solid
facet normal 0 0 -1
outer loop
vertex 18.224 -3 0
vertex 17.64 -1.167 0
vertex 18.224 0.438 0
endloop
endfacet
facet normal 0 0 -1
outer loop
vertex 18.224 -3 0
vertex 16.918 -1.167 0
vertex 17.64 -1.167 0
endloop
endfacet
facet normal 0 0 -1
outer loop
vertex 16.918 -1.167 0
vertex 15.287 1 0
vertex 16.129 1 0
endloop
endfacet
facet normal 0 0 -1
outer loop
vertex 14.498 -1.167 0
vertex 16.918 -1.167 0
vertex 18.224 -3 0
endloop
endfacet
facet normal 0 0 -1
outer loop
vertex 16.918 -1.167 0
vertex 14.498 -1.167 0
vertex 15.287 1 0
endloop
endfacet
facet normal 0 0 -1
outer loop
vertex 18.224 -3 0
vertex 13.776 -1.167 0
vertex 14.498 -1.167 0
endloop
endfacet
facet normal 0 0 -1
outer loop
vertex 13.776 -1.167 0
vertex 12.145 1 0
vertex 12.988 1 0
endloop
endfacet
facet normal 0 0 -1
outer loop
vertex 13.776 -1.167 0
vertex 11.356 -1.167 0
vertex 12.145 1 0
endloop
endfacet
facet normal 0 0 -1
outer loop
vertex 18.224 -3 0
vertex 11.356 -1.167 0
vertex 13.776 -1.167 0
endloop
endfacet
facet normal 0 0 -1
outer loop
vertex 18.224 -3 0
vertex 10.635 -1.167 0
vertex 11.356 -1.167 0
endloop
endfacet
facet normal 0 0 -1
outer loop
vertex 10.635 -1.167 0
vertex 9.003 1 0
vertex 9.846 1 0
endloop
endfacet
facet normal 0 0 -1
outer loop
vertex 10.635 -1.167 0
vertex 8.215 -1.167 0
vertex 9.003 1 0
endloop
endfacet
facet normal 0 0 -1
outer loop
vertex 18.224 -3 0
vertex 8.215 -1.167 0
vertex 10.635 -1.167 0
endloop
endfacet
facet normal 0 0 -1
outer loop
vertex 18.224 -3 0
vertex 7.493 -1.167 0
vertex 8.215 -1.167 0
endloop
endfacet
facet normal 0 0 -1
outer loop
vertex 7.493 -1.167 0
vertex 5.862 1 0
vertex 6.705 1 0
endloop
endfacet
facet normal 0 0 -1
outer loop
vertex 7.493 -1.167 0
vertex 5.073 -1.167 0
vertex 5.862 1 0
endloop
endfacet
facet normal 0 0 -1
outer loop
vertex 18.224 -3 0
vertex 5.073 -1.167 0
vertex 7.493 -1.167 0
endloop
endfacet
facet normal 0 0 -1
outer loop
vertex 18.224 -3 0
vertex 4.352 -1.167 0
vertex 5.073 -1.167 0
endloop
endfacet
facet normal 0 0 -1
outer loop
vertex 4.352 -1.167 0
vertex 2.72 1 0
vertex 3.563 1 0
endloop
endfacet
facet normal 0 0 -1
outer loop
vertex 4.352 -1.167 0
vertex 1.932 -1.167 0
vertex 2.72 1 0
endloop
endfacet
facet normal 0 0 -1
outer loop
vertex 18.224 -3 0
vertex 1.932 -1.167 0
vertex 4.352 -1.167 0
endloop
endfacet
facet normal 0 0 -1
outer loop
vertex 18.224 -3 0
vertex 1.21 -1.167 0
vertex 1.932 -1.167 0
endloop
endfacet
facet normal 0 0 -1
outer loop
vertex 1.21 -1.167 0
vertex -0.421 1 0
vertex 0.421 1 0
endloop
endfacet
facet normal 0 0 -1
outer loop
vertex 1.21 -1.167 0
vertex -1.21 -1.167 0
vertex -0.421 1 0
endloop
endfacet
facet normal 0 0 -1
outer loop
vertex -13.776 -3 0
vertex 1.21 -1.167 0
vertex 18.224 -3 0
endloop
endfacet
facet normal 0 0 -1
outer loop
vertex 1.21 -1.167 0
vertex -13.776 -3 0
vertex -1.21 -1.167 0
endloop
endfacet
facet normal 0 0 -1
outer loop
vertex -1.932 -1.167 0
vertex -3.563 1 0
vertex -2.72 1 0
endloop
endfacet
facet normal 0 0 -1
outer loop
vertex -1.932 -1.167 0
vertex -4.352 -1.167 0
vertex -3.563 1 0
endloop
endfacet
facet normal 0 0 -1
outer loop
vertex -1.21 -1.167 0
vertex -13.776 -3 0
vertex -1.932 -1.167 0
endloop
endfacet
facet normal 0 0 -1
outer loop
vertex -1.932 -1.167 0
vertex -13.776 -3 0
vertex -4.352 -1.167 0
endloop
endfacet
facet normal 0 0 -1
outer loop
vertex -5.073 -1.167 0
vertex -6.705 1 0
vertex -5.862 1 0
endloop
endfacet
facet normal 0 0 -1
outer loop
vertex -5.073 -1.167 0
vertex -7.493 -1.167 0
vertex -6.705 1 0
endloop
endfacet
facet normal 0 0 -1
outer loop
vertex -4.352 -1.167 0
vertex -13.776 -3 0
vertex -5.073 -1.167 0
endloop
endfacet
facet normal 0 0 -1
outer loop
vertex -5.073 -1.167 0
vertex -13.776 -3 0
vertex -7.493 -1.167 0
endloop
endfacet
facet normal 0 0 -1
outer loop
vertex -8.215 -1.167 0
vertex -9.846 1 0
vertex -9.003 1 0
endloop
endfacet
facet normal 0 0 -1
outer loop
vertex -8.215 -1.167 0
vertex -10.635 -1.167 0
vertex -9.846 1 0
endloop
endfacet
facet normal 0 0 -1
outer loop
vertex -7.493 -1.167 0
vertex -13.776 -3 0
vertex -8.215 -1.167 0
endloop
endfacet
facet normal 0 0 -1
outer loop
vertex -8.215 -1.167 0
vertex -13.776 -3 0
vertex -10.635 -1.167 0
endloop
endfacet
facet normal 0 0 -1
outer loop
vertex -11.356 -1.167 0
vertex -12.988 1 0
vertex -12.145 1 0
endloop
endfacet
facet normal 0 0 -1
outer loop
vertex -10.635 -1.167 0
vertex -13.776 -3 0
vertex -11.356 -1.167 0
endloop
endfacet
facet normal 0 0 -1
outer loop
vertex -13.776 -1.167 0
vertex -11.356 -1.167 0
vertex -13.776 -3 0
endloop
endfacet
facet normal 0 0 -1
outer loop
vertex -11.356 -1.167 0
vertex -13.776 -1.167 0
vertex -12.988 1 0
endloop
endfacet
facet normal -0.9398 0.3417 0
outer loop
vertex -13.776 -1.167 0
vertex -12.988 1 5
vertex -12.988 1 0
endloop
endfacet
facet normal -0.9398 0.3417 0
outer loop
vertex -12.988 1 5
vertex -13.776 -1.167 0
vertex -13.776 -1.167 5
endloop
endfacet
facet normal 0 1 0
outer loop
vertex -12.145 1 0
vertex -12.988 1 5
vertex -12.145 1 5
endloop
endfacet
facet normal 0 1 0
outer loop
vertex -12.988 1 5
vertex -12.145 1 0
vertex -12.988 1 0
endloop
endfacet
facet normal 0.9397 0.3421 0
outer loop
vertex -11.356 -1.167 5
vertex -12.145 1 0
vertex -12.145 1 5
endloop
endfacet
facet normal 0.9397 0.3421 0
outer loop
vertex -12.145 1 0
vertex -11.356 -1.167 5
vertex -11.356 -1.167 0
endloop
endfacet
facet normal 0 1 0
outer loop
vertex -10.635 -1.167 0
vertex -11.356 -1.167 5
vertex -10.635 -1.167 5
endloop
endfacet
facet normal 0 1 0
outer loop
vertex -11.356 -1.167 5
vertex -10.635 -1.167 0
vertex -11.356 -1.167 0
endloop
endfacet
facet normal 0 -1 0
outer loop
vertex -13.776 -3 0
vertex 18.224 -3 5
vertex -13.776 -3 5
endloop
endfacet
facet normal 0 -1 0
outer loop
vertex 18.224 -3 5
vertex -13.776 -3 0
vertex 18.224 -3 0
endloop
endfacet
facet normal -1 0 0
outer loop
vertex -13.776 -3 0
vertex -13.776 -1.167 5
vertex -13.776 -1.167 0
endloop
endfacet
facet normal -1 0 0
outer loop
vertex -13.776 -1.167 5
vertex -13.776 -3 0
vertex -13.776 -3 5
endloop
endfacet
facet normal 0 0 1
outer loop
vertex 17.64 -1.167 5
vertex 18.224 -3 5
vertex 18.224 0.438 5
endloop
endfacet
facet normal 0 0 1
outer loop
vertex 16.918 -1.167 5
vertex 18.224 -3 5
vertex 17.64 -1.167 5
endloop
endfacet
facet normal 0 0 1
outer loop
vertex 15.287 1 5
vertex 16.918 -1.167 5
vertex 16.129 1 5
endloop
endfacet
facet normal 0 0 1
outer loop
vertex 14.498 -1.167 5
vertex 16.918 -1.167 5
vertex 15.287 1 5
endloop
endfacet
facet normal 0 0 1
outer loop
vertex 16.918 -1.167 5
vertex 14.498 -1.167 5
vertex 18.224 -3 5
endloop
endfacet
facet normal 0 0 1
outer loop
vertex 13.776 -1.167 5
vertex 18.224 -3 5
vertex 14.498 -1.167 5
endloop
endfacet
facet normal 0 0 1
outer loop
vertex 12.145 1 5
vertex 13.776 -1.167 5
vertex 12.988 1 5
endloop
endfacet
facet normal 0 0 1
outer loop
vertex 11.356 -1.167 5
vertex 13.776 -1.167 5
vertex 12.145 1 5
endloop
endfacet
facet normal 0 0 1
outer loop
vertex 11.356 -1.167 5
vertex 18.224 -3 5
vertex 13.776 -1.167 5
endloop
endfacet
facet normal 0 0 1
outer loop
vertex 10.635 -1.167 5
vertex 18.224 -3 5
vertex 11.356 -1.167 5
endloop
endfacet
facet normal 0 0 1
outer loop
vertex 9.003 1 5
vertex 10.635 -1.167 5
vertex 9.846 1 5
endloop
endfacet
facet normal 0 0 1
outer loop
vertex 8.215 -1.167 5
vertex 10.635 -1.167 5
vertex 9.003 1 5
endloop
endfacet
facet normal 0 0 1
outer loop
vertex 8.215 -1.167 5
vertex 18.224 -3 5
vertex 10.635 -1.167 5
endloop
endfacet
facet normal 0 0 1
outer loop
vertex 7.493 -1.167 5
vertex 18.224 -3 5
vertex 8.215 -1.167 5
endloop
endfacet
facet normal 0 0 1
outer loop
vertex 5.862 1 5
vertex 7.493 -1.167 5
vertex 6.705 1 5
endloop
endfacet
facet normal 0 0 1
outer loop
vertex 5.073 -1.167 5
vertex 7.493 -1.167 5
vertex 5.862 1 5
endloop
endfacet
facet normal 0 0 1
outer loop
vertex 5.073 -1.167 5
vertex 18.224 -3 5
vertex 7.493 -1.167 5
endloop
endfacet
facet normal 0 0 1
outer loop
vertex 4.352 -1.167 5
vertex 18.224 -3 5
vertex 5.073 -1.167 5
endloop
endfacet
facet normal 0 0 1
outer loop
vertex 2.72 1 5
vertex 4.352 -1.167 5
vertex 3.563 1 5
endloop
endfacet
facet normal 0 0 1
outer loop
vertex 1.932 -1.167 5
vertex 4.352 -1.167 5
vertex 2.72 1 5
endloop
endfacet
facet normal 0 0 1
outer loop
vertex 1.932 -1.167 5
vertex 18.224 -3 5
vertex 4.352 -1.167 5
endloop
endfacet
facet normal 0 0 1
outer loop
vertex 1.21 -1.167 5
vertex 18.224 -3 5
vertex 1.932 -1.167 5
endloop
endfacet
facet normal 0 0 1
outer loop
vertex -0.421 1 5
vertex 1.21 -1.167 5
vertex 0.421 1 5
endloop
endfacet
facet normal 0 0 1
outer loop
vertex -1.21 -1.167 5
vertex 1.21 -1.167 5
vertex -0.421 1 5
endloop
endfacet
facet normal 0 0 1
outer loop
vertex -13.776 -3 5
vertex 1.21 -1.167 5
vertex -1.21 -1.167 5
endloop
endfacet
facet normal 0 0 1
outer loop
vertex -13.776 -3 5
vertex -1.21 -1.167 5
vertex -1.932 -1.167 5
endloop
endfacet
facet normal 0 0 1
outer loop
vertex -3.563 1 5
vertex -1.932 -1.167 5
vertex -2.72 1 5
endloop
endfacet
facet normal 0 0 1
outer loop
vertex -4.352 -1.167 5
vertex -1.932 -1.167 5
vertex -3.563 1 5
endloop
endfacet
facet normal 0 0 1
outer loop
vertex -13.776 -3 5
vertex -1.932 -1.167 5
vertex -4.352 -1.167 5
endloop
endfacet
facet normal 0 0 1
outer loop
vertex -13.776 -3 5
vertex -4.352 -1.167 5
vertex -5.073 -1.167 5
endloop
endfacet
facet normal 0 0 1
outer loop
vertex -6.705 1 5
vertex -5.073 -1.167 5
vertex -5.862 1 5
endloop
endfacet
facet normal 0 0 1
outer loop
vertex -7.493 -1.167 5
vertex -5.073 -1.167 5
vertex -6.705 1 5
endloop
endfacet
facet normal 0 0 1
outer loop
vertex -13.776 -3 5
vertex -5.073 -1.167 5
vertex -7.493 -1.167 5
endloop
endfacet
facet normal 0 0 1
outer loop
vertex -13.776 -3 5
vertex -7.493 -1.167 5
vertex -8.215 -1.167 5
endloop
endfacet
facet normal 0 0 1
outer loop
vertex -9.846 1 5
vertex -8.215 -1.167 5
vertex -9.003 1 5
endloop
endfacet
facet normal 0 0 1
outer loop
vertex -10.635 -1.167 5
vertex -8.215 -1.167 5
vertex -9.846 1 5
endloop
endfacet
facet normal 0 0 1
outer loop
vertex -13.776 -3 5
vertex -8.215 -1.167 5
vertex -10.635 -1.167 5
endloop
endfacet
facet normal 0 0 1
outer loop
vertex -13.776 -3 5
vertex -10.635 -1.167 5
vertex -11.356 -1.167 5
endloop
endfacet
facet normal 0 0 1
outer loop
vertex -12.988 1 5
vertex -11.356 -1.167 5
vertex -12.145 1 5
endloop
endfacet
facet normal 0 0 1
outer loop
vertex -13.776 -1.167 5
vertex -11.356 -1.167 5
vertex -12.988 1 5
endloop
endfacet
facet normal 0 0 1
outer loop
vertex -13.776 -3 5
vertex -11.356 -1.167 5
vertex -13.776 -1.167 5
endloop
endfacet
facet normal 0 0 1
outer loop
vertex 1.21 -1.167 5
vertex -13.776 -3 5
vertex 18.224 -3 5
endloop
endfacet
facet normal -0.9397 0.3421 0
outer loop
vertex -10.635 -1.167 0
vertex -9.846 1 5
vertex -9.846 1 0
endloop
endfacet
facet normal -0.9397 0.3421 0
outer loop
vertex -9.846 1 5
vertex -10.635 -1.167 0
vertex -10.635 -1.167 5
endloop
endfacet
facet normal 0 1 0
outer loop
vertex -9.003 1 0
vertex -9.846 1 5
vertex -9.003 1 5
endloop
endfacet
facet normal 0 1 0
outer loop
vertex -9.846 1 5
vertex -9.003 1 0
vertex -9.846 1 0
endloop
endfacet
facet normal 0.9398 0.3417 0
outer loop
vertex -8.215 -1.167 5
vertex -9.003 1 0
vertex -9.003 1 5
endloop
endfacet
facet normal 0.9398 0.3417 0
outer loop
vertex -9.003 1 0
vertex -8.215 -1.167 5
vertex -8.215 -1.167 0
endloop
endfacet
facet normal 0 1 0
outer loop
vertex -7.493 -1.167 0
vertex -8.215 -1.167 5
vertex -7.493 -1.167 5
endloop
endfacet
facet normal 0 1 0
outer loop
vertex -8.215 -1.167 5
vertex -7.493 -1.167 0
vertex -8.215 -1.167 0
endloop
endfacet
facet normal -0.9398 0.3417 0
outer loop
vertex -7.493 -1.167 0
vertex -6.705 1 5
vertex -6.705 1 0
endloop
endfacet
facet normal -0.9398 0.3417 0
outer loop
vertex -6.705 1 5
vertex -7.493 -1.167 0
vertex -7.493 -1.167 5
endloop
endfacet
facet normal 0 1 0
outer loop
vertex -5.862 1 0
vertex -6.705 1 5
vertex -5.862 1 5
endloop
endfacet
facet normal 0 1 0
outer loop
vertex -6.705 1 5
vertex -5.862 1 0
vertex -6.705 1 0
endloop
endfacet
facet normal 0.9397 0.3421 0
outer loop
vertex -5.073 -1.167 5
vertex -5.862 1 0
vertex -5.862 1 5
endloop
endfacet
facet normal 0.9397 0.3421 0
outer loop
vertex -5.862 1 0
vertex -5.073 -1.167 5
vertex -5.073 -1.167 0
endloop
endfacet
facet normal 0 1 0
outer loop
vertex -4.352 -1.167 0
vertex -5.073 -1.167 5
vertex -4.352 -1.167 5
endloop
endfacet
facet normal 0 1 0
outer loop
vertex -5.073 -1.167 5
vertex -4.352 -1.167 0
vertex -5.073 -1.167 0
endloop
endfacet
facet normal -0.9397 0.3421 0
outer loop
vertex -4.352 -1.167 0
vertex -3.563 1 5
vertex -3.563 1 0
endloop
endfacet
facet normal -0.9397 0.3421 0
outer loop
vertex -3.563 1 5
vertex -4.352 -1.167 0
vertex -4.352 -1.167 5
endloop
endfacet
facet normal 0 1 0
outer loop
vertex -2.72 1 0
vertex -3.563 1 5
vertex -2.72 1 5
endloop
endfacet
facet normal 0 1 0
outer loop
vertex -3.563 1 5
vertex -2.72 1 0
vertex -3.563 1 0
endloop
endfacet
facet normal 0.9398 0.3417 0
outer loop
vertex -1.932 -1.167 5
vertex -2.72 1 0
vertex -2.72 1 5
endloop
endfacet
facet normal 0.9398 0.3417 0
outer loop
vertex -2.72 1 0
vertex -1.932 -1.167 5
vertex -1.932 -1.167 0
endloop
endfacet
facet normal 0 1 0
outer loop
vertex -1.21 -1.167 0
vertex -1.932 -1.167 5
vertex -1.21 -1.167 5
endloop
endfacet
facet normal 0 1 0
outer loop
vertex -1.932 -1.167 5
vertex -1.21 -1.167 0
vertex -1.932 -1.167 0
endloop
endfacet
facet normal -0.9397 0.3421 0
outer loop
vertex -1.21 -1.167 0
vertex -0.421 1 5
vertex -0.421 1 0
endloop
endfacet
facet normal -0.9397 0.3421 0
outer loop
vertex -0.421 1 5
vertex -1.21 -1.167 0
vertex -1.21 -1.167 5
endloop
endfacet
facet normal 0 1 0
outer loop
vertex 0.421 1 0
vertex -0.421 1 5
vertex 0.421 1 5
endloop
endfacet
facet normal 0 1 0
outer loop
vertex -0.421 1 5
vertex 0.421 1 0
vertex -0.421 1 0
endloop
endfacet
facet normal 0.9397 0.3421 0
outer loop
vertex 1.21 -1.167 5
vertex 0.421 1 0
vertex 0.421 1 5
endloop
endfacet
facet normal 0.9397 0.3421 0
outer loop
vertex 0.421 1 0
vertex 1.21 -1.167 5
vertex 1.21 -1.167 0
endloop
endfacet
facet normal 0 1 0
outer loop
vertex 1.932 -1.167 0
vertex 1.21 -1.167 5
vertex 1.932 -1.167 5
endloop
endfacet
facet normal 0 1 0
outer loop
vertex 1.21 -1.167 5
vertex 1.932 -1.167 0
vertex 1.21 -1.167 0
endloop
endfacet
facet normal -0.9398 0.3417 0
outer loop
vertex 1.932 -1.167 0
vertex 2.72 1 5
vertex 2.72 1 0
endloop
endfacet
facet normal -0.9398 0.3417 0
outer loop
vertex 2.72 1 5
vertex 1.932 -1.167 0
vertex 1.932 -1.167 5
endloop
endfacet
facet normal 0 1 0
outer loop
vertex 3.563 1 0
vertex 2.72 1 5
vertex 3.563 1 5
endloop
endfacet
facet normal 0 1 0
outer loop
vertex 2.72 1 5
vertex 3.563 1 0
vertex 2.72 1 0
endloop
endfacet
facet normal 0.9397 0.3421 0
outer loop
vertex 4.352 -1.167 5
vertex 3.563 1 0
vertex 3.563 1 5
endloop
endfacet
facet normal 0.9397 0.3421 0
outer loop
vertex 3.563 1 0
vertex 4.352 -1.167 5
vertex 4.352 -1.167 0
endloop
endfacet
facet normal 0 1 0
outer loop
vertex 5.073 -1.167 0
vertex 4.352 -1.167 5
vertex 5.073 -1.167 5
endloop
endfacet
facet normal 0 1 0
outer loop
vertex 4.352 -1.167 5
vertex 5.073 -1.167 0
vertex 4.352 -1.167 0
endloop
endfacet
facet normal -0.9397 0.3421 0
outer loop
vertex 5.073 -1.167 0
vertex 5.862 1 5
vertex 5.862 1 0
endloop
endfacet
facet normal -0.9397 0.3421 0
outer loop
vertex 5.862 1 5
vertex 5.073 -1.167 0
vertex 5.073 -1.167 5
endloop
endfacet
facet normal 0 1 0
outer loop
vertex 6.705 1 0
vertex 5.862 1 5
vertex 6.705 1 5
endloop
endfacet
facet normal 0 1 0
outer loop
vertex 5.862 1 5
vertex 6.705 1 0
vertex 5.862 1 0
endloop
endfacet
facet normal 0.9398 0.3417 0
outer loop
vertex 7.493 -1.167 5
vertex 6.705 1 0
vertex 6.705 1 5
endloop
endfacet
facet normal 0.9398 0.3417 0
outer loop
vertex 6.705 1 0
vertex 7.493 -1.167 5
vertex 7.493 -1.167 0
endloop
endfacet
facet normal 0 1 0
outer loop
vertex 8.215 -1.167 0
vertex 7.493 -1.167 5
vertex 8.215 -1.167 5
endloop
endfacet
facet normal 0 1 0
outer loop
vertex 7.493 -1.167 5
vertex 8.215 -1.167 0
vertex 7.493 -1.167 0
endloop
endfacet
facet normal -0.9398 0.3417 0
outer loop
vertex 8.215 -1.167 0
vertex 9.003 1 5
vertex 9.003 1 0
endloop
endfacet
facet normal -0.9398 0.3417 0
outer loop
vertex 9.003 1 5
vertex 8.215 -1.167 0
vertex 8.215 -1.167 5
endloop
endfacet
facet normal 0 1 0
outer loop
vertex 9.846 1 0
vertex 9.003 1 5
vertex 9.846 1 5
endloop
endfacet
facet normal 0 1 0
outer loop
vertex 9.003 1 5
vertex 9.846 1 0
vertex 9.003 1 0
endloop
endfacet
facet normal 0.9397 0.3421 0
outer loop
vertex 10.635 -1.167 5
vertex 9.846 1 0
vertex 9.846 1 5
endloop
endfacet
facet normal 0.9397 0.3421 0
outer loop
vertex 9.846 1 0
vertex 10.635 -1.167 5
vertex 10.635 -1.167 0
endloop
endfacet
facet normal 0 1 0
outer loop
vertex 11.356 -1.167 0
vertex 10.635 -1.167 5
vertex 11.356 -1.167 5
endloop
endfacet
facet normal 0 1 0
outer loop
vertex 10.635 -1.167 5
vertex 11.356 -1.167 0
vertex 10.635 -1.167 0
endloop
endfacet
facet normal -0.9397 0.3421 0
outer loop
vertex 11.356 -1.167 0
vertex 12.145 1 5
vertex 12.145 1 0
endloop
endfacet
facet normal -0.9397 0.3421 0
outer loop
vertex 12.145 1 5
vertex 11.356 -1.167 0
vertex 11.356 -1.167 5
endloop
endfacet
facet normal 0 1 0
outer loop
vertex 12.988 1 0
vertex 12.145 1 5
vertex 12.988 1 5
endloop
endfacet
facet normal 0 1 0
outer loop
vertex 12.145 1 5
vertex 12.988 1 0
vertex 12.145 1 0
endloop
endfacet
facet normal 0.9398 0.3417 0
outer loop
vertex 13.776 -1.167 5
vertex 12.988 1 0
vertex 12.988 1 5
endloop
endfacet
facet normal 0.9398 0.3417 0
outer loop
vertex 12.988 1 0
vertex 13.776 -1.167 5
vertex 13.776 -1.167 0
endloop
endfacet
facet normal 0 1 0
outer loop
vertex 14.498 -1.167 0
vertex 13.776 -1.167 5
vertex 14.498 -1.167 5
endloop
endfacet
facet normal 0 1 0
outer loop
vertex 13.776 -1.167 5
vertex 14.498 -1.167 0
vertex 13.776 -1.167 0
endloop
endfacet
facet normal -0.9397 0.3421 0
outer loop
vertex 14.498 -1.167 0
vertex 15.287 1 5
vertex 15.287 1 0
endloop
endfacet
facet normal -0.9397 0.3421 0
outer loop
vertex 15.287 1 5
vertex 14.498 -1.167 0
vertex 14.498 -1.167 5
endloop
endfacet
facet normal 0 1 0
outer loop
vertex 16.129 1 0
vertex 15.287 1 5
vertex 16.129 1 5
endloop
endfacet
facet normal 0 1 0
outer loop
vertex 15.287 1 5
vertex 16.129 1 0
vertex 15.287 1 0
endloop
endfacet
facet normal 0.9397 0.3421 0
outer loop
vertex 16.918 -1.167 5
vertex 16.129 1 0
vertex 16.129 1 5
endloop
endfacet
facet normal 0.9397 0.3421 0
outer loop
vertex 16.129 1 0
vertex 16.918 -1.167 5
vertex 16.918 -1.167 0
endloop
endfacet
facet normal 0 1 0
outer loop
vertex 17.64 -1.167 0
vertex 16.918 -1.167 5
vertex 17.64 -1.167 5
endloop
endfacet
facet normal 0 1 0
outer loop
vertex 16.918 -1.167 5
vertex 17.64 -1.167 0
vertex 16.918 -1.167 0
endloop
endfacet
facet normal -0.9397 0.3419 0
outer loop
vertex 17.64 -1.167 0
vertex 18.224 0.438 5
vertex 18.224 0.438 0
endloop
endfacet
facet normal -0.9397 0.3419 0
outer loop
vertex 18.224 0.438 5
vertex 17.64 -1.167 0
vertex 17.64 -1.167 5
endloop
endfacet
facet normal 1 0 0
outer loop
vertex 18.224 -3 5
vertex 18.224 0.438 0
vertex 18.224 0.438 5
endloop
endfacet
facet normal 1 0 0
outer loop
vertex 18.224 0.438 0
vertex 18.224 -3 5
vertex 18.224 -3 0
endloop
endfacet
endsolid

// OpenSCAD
// Kopfspiel
spiel = 0.05;
// Hoehe des Zahnkopfes ueber der Waelzgeraden
modul = 1;
// Laenge der Zahnstange
laenge = 32;
// Hoehe der Zahnstange bis zur Waelzgeraden
hoehe = 3;
// Breite der Zaehne
breite = 5;
// Eingriffswinkel, Standardwert = 20 grad gemaess DIN 867. Sollte nicht groesser als 45 grad sein.
eingriffswinkel = 20;
// Schraegungswinkel zur Zahnstangen-Querachse; 0 grad = Geradverzahnung
schraegungswinkel = 0;

/* Bibliothek fuer Zahnstange fuer Thingiverse Customizer

Enthaelt die Module
zahnstange(modul, laenge, hoehe, breite, eingriffswinkel = 20, schraegungswinkel = 0)

Autor:		Dr Joerg Janssen
Stand:		6. Januar 2017
Version:	2.0
Lizenz:		Creative Commons - Attribution, Non Commercial, Share Alike

Erlaubte Module nach DIN 780:
0.05 0.06 0.08 0.10 0.12 0.16
0.20 0.25 0.3  0.4  0.5  0.6
0.7  0.8  0.9  1    1.25 1.5
2    2.5  3    4    5    6
8    10   12   16   20   25
32   40   50   60

*/


/* [Hidden] */
pi = 3.14159;
rad = 57.29578;
$fn = 96;

/*	Kopiert und dreht einen Koerper */
module kopiere(vect, zahl, abstand, winkel){
	for(i = [0:zahl-1]){
		translate(v=vect*abstand*i)
			rotate(a=i*winkel, v = [0,0,1])
				children(0);
	}
}

/*  Zahnstange
    modul = Hoehe des Zahnkopfes ueber der Waelzgeraden
    laenge = Laenge der Zahnstange
    hoehe = Hoehe der Zahnstange bis zur Waelzgeraden
    breite = Breite der Zaehne
    eingriffswinkel = Eingriffswinkel, Standardwert = 20 grad gemaess DIN 867. Sollte nicht groesser als 45 grad sein.
    schraegungswinkel = Schraegungswinkel zur Zahnstangen-Querachse; 0 grad = Geradverzahnung */
module zahnstange(modul, laenge, hoehe, breite, eingriffswinkel = 20, schraegungswinkel = 0) {

	// Dimensions-Berechnungen
	c = modul / 6;												// Kopfspiel
	mx = modul/cos(schraegungswinkel);							// Durch Schraegungswinkel verzerrtes modul in x-Richtung
	a = 2*mx*tan(eingriffswinkel)+c*tan(eingriffswinkel);		// Flankenbreite
	b = pi*mx/2-2*mx*tan(eingriffswinkel);						// Kopfbreite
	x = breite*tan(schraegungswinkel);							// Verschiebung der Oberseite in x-Richtung durch Schraegungswinkel
	nz = ceil((laenge+abs(2*x))/(pi*mx));						// Anzahl der Zaehne
	
	translate([-pi*mx*(floor(nz/2)-1)-a-b/2,-modul,0]){
		intersection(){
			kopiere([1,0,0], nz, pi*mx, 0){
				polyhedron(
					points=[[0,-c,0], [a,2*modul,0], [a+b,2*modul,0], [2*a+b,-c,0], [pi*mx,-c,0], [pi*mx,modul-hoehe,0], [0,modul-hoehe,0],	// Unterseite
						[0+x,-c,breite], [a+x,2*modul,breite], [a+b+x,2*modul,breite], [2*a+b+x,-c,breite], [pi*mx+x,-c,breite], [pi*mx+x,modul-hoehe,breite], [0+x,modul-hoehe,breite]],	// Oberseite
					faces=[[6,5,4,3,2,1,0],						// Unterseite
						[1,8,7,0],
						[9,8,1,2],
						[10,9,2,3],
						[11,10,3,4],
						[12,11,4,5],
						[13,12,5,6],
						[7,13,6,0],
						[7,8,9,10,11,12,13],					// Oberseite
					]
				);
			};
			translate([abs(x),-hoehe+modul-0.5,-0.5]){
				cube([laenge,hoehe+modul+1,breite+1]);
			}	
		};
	};	
}

zahnstange(modul, laenge, hoehe, breite, eingriffswinkel, schraegungswinkel);
